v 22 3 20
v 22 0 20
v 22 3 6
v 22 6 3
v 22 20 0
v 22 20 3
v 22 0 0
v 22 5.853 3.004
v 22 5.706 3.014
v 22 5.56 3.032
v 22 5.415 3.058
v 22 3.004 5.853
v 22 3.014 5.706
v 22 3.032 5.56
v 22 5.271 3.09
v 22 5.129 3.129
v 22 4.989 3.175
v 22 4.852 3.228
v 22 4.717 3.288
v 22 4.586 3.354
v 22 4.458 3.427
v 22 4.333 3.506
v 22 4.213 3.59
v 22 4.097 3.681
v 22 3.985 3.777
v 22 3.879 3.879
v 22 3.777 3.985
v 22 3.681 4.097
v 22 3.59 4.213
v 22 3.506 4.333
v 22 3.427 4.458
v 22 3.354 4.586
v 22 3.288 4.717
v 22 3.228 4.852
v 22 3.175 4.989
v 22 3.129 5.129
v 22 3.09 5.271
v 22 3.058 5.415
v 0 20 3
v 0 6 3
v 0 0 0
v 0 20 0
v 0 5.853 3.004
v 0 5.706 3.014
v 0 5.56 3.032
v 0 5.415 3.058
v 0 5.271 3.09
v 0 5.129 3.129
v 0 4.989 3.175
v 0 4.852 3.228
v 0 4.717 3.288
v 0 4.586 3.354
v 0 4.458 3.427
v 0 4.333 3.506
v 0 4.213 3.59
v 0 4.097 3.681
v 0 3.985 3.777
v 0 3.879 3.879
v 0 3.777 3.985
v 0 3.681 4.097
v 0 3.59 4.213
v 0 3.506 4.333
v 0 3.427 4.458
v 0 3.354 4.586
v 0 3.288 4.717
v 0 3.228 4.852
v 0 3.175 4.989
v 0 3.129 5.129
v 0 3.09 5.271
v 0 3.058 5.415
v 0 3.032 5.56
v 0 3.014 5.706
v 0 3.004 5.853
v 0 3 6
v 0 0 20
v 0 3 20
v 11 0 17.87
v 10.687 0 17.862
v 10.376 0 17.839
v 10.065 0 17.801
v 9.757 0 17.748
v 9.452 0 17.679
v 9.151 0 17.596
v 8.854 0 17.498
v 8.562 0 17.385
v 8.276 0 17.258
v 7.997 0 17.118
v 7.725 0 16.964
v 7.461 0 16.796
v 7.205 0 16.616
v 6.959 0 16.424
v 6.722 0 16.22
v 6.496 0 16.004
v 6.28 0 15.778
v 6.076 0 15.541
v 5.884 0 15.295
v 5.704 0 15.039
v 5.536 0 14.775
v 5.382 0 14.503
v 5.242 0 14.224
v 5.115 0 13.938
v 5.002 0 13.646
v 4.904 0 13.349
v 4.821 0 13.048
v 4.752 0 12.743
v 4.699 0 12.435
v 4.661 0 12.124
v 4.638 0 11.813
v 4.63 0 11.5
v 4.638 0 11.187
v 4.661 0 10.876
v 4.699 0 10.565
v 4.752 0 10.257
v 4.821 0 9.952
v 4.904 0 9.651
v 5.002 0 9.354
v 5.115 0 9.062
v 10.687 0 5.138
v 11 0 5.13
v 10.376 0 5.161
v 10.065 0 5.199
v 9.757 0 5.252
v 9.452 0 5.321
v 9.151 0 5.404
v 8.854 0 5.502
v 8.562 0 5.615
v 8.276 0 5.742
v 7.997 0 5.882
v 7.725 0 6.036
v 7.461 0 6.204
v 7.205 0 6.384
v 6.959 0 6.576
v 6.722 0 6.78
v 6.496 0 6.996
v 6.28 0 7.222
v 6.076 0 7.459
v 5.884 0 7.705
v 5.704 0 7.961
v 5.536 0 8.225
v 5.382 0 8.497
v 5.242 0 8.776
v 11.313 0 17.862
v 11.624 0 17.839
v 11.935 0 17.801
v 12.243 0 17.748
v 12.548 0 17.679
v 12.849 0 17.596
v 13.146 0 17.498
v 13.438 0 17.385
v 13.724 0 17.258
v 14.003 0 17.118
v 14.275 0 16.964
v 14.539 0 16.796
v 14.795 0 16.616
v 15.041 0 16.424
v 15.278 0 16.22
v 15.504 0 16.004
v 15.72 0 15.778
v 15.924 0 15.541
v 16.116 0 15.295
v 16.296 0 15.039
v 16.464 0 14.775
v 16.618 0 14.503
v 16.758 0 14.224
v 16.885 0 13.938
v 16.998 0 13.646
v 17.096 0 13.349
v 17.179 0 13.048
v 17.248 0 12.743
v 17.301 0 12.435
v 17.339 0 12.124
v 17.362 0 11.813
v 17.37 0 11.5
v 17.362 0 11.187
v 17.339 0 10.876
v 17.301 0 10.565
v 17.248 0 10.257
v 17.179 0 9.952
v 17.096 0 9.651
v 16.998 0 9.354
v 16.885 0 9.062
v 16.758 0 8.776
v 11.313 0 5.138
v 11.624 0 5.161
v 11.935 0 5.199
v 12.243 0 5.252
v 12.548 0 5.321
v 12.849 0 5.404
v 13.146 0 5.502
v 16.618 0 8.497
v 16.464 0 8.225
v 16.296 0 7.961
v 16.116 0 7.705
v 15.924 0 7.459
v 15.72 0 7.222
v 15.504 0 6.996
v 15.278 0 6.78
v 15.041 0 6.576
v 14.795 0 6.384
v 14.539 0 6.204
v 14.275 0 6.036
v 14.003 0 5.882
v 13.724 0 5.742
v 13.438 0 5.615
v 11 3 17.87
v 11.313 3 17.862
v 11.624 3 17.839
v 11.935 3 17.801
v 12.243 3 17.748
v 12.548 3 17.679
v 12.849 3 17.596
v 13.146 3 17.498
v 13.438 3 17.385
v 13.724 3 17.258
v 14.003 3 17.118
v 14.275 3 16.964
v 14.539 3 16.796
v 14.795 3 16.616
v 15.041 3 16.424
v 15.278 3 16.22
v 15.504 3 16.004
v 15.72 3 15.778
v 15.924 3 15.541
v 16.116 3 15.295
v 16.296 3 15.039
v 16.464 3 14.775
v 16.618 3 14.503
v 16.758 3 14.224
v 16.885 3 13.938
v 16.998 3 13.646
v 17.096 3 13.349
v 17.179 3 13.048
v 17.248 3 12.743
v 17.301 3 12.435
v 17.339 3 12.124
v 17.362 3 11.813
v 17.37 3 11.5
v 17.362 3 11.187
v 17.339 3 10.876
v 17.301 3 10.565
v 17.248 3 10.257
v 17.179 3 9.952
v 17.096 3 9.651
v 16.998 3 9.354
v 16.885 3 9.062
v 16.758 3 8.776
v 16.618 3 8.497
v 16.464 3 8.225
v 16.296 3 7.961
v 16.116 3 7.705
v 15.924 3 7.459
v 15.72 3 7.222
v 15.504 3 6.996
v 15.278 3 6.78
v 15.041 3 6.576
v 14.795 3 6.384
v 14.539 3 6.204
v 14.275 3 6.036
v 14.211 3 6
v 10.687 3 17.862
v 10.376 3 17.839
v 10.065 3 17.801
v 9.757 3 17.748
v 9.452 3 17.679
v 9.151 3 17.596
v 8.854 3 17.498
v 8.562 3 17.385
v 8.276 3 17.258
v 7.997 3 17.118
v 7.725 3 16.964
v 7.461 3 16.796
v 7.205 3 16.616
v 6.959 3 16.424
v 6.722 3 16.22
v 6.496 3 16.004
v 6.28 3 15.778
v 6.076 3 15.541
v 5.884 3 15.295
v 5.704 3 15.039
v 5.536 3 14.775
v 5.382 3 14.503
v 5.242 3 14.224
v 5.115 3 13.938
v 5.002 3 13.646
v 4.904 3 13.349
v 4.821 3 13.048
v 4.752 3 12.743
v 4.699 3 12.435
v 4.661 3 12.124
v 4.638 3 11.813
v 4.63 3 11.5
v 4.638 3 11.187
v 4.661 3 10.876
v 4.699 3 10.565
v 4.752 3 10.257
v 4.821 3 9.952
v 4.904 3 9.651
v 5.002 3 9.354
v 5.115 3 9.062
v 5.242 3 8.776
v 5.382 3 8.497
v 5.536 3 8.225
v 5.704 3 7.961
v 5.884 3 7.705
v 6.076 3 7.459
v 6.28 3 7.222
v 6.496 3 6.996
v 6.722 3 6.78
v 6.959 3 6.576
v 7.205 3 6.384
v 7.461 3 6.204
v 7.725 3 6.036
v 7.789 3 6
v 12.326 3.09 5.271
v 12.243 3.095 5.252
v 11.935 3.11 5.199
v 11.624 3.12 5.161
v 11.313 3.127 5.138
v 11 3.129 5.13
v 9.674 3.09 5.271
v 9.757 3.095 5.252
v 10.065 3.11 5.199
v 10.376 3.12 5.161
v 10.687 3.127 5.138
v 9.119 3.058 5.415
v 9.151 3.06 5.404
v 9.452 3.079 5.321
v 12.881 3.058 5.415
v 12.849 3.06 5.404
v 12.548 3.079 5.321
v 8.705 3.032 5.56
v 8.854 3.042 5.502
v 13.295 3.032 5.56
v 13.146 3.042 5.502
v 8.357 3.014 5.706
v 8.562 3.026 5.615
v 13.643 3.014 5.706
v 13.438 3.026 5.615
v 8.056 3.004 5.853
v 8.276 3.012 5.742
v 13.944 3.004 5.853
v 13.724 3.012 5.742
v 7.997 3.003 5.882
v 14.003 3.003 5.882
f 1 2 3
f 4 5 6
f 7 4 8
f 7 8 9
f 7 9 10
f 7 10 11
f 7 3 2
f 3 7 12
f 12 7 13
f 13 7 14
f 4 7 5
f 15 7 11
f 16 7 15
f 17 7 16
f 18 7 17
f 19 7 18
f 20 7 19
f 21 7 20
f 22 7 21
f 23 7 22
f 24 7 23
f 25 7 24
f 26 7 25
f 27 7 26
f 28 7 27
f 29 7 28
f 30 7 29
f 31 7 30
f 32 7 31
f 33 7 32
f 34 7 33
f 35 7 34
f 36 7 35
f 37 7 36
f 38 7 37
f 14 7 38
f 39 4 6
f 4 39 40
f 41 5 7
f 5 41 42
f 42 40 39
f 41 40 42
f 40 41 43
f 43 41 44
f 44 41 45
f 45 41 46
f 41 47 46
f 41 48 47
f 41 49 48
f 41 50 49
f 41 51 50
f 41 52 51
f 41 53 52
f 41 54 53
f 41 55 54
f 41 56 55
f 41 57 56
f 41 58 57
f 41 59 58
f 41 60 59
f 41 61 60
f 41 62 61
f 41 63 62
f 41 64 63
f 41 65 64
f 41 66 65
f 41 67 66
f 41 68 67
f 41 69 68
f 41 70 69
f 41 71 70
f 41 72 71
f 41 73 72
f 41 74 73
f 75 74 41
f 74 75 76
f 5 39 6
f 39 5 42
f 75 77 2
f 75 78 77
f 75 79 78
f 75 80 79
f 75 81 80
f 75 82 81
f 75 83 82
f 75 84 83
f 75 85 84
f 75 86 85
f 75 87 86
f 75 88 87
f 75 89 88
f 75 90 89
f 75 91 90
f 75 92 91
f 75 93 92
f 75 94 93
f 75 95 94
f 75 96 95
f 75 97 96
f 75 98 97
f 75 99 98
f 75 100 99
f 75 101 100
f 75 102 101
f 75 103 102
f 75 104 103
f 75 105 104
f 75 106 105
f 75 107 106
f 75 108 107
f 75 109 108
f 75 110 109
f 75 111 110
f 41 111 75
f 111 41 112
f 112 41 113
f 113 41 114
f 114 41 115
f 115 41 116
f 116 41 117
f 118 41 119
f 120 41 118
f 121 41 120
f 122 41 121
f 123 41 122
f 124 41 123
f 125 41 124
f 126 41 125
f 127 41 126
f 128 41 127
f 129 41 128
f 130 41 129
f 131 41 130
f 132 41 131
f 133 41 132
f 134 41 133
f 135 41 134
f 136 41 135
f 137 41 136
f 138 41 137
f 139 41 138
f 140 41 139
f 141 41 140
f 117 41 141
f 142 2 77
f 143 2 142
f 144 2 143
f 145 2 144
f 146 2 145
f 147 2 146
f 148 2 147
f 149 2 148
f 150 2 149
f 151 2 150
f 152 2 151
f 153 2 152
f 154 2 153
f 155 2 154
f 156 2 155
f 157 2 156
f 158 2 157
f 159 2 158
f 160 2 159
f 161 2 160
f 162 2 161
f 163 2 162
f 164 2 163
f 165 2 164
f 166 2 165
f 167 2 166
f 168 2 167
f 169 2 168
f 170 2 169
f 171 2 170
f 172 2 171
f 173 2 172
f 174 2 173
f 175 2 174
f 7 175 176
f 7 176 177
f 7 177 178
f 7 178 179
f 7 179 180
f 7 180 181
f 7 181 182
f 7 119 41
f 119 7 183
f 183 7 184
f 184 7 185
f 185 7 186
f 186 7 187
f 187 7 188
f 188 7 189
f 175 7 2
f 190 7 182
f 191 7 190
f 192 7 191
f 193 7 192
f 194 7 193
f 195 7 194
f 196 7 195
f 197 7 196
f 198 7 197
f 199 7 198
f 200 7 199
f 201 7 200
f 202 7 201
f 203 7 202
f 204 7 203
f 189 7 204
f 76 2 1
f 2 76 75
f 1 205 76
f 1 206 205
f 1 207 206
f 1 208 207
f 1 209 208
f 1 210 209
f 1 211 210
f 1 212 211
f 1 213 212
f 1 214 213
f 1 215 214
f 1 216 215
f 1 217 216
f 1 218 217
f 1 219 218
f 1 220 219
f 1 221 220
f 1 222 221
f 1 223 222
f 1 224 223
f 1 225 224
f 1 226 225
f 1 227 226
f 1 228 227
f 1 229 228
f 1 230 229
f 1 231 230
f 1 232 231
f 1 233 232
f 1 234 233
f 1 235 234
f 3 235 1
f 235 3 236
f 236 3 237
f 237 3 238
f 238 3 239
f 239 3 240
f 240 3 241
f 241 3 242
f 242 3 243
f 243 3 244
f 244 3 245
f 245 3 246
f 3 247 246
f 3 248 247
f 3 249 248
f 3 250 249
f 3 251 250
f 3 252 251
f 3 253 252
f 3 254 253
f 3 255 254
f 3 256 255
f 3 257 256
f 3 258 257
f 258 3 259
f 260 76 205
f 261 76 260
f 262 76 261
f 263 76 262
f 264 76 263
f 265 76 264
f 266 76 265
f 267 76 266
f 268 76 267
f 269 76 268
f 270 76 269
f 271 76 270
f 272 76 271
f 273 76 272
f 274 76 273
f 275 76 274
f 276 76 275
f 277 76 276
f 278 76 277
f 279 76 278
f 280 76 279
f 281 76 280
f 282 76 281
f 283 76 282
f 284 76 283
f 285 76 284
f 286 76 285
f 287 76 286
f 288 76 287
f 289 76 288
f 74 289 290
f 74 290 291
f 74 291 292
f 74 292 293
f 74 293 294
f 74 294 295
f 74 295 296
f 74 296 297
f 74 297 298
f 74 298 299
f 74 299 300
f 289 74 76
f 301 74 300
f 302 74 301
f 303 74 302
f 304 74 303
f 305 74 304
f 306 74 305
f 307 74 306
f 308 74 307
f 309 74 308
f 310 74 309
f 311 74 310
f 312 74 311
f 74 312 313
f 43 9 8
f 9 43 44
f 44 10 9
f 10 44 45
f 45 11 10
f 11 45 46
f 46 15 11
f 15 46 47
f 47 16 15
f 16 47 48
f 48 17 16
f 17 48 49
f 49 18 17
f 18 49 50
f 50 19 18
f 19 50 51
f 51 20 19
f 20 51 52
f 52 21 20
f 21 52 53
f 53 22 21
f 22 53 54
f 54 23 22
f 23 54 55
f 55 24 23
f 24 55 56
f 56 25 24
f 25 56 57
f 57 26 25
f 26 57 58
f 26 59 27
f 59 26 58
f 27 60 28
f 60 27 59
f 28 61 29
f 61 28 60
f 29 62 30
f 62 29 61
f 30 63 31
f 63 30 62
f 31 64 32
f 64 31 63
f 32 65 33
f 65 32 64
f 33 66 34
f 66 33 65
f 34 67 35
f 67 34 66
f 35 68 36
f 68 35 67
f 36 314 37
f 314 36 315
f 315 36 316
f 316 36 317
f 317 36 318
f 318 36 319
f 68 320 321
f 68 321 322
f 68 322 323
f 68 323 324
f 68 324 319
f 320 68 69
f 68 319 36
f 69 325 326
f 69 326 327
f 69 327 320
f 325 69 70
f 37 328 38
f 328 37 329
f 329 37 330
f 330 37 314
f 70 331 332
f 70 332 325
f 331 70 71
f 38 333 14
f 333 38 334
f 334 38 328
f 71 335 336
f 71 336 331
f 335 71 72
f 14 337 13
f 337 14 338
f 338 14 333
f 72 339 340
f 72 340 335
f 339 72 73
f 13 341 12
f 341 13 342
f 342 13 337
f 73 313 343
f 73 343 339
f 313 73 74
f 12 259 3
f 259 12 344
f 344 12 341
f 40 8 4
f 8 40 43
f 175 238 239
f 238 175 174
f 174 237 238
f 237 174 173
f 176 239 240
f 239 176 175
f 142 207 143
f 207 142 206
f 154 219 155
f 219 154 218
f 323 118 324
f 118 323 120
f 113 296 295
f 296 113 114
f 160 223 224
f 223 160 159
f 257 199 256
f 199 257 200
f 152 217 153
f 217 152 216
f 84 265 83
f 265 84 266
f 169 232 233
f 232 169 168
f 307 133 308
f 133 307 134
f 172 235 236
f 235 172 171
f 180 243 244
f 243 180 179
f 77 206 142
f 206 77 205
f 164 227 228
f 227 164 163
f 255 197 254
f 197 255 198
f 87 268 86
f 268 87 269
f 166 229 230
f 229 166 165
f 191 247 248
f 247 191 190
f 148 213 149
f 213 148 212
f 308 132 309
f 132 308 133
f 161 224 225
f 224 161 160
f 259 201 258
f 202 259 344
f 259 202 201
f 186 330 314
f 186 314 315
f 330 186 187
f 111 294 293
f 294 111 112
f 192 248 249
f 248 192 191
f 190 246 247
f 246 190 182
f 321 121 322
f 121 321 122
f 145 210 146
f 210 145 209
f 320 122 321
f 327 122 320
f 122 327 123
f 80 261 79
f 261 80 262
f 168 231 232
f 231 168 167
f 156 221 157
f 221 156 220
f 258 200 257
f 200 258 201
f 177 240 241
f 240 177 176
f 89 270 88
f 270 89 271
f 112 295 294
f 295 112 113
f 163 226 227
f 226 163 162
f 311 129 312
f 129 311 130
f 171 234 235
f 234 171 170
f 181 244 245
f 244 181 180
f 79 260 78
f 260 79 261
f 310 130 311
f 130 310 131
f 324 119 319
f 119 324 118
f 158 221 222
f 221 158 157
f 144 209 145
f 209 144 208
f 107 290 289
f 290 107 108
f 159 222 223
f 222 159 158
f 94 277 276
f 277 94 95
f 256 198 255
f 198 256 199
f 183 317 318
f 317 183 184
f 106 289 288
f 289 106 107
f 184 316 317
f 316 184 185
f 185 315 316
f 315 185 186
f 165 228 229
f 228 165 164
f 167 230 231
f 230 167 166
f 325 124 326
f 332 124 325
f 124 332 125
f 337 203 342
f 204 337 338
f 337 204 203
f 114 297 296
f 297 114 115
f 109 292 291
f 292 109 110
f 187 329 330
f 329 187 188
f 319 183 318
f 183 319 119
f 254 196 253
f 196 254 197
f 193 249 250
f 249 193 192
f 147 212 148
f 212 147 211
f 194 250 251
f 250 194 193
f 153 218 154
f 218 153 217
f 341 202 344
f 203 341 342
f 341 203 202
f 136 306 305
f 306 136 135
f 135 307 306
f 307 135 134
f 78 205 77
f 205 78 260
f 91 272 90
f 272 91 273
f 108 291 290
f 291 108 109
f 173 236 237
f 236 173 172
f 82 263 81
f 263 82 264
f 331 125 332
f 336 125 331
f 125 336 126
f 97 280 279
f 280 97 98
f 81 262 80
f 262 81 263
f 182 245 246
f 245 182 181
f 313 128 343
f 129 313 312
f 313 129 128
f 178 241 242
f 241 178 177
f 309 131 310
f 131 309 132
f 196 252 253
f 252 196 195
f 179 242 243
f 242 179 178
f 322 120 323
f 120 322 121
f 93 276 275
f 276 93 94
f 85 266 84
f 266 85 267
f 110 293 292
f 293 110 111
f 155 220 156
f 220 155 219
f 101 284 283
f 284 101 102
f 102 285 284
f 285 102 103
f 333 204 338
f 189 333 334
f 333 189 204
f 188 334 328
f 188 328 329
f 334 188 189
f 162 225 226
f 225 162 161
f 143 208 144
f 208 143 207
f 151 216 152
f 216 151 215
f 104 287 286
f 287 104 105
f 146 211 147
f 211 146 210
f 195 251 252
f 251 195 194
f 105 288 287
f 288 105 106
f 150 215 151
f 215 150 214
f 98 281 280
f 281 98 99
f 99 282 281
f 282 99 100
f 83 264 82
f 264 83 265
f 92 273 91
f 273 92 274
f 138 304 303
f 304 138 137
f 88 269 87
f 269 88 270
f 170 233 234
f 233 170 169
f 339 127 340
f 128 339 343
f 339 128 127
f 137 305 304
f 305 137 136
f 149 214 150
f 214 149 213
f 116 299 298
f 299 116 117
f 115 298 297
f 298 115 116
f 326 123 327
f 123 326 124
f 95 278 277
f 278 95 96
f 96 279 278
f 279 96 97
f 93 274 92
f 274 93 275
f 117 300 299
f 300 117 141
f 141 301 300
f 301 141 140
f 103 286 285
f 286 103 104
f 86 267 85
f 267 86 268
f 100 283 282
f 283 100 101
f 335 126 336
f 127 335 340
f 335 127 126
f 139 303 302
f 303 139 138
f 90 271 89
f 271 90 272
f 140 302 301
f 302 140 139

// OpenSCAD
// Angle bracket for the USB-to-vacuum dongle, glued to the plate.
// The 4-pin 1/2" panel connector goes through the hole in the upright face.
// Origin: outside corner of the angle; base on z=0, upright face at y=0 going up.
$fn = 128;

W      = 22;     // width of the bracket (along the angle)
H      = 20;     // height of the upright face
D      = 20;     // depth of the base leg
TH     = 3;      // wall thickness
HOLE_D = 12.74;  // connector hole
FIL    = 3;      // inside fillet between the legs, for strength

// hole centred on the free part of the face (above the base)
HOLE_Z = TH + (H - TH) / 2;

difference() {
    union() {
        cube([W, D, TH]);                 // base
        cube([W, TH, H]);                 // upright
        // inside fillet
        translate([0, TH, TH]) rotate([0, 90, 0]) rotate([0, 0, 90])
            linear_extrude(W) difference() {
                square([FIL, FIL]);
                translate([FIL, FIL]) circle(r = FIL);
            }
    }
    translate([W / 2, -1, HOLE_Z]) rotate([-90, 0, 0]) cylinder(d = HOLE_D, h = TH + 2);
}
